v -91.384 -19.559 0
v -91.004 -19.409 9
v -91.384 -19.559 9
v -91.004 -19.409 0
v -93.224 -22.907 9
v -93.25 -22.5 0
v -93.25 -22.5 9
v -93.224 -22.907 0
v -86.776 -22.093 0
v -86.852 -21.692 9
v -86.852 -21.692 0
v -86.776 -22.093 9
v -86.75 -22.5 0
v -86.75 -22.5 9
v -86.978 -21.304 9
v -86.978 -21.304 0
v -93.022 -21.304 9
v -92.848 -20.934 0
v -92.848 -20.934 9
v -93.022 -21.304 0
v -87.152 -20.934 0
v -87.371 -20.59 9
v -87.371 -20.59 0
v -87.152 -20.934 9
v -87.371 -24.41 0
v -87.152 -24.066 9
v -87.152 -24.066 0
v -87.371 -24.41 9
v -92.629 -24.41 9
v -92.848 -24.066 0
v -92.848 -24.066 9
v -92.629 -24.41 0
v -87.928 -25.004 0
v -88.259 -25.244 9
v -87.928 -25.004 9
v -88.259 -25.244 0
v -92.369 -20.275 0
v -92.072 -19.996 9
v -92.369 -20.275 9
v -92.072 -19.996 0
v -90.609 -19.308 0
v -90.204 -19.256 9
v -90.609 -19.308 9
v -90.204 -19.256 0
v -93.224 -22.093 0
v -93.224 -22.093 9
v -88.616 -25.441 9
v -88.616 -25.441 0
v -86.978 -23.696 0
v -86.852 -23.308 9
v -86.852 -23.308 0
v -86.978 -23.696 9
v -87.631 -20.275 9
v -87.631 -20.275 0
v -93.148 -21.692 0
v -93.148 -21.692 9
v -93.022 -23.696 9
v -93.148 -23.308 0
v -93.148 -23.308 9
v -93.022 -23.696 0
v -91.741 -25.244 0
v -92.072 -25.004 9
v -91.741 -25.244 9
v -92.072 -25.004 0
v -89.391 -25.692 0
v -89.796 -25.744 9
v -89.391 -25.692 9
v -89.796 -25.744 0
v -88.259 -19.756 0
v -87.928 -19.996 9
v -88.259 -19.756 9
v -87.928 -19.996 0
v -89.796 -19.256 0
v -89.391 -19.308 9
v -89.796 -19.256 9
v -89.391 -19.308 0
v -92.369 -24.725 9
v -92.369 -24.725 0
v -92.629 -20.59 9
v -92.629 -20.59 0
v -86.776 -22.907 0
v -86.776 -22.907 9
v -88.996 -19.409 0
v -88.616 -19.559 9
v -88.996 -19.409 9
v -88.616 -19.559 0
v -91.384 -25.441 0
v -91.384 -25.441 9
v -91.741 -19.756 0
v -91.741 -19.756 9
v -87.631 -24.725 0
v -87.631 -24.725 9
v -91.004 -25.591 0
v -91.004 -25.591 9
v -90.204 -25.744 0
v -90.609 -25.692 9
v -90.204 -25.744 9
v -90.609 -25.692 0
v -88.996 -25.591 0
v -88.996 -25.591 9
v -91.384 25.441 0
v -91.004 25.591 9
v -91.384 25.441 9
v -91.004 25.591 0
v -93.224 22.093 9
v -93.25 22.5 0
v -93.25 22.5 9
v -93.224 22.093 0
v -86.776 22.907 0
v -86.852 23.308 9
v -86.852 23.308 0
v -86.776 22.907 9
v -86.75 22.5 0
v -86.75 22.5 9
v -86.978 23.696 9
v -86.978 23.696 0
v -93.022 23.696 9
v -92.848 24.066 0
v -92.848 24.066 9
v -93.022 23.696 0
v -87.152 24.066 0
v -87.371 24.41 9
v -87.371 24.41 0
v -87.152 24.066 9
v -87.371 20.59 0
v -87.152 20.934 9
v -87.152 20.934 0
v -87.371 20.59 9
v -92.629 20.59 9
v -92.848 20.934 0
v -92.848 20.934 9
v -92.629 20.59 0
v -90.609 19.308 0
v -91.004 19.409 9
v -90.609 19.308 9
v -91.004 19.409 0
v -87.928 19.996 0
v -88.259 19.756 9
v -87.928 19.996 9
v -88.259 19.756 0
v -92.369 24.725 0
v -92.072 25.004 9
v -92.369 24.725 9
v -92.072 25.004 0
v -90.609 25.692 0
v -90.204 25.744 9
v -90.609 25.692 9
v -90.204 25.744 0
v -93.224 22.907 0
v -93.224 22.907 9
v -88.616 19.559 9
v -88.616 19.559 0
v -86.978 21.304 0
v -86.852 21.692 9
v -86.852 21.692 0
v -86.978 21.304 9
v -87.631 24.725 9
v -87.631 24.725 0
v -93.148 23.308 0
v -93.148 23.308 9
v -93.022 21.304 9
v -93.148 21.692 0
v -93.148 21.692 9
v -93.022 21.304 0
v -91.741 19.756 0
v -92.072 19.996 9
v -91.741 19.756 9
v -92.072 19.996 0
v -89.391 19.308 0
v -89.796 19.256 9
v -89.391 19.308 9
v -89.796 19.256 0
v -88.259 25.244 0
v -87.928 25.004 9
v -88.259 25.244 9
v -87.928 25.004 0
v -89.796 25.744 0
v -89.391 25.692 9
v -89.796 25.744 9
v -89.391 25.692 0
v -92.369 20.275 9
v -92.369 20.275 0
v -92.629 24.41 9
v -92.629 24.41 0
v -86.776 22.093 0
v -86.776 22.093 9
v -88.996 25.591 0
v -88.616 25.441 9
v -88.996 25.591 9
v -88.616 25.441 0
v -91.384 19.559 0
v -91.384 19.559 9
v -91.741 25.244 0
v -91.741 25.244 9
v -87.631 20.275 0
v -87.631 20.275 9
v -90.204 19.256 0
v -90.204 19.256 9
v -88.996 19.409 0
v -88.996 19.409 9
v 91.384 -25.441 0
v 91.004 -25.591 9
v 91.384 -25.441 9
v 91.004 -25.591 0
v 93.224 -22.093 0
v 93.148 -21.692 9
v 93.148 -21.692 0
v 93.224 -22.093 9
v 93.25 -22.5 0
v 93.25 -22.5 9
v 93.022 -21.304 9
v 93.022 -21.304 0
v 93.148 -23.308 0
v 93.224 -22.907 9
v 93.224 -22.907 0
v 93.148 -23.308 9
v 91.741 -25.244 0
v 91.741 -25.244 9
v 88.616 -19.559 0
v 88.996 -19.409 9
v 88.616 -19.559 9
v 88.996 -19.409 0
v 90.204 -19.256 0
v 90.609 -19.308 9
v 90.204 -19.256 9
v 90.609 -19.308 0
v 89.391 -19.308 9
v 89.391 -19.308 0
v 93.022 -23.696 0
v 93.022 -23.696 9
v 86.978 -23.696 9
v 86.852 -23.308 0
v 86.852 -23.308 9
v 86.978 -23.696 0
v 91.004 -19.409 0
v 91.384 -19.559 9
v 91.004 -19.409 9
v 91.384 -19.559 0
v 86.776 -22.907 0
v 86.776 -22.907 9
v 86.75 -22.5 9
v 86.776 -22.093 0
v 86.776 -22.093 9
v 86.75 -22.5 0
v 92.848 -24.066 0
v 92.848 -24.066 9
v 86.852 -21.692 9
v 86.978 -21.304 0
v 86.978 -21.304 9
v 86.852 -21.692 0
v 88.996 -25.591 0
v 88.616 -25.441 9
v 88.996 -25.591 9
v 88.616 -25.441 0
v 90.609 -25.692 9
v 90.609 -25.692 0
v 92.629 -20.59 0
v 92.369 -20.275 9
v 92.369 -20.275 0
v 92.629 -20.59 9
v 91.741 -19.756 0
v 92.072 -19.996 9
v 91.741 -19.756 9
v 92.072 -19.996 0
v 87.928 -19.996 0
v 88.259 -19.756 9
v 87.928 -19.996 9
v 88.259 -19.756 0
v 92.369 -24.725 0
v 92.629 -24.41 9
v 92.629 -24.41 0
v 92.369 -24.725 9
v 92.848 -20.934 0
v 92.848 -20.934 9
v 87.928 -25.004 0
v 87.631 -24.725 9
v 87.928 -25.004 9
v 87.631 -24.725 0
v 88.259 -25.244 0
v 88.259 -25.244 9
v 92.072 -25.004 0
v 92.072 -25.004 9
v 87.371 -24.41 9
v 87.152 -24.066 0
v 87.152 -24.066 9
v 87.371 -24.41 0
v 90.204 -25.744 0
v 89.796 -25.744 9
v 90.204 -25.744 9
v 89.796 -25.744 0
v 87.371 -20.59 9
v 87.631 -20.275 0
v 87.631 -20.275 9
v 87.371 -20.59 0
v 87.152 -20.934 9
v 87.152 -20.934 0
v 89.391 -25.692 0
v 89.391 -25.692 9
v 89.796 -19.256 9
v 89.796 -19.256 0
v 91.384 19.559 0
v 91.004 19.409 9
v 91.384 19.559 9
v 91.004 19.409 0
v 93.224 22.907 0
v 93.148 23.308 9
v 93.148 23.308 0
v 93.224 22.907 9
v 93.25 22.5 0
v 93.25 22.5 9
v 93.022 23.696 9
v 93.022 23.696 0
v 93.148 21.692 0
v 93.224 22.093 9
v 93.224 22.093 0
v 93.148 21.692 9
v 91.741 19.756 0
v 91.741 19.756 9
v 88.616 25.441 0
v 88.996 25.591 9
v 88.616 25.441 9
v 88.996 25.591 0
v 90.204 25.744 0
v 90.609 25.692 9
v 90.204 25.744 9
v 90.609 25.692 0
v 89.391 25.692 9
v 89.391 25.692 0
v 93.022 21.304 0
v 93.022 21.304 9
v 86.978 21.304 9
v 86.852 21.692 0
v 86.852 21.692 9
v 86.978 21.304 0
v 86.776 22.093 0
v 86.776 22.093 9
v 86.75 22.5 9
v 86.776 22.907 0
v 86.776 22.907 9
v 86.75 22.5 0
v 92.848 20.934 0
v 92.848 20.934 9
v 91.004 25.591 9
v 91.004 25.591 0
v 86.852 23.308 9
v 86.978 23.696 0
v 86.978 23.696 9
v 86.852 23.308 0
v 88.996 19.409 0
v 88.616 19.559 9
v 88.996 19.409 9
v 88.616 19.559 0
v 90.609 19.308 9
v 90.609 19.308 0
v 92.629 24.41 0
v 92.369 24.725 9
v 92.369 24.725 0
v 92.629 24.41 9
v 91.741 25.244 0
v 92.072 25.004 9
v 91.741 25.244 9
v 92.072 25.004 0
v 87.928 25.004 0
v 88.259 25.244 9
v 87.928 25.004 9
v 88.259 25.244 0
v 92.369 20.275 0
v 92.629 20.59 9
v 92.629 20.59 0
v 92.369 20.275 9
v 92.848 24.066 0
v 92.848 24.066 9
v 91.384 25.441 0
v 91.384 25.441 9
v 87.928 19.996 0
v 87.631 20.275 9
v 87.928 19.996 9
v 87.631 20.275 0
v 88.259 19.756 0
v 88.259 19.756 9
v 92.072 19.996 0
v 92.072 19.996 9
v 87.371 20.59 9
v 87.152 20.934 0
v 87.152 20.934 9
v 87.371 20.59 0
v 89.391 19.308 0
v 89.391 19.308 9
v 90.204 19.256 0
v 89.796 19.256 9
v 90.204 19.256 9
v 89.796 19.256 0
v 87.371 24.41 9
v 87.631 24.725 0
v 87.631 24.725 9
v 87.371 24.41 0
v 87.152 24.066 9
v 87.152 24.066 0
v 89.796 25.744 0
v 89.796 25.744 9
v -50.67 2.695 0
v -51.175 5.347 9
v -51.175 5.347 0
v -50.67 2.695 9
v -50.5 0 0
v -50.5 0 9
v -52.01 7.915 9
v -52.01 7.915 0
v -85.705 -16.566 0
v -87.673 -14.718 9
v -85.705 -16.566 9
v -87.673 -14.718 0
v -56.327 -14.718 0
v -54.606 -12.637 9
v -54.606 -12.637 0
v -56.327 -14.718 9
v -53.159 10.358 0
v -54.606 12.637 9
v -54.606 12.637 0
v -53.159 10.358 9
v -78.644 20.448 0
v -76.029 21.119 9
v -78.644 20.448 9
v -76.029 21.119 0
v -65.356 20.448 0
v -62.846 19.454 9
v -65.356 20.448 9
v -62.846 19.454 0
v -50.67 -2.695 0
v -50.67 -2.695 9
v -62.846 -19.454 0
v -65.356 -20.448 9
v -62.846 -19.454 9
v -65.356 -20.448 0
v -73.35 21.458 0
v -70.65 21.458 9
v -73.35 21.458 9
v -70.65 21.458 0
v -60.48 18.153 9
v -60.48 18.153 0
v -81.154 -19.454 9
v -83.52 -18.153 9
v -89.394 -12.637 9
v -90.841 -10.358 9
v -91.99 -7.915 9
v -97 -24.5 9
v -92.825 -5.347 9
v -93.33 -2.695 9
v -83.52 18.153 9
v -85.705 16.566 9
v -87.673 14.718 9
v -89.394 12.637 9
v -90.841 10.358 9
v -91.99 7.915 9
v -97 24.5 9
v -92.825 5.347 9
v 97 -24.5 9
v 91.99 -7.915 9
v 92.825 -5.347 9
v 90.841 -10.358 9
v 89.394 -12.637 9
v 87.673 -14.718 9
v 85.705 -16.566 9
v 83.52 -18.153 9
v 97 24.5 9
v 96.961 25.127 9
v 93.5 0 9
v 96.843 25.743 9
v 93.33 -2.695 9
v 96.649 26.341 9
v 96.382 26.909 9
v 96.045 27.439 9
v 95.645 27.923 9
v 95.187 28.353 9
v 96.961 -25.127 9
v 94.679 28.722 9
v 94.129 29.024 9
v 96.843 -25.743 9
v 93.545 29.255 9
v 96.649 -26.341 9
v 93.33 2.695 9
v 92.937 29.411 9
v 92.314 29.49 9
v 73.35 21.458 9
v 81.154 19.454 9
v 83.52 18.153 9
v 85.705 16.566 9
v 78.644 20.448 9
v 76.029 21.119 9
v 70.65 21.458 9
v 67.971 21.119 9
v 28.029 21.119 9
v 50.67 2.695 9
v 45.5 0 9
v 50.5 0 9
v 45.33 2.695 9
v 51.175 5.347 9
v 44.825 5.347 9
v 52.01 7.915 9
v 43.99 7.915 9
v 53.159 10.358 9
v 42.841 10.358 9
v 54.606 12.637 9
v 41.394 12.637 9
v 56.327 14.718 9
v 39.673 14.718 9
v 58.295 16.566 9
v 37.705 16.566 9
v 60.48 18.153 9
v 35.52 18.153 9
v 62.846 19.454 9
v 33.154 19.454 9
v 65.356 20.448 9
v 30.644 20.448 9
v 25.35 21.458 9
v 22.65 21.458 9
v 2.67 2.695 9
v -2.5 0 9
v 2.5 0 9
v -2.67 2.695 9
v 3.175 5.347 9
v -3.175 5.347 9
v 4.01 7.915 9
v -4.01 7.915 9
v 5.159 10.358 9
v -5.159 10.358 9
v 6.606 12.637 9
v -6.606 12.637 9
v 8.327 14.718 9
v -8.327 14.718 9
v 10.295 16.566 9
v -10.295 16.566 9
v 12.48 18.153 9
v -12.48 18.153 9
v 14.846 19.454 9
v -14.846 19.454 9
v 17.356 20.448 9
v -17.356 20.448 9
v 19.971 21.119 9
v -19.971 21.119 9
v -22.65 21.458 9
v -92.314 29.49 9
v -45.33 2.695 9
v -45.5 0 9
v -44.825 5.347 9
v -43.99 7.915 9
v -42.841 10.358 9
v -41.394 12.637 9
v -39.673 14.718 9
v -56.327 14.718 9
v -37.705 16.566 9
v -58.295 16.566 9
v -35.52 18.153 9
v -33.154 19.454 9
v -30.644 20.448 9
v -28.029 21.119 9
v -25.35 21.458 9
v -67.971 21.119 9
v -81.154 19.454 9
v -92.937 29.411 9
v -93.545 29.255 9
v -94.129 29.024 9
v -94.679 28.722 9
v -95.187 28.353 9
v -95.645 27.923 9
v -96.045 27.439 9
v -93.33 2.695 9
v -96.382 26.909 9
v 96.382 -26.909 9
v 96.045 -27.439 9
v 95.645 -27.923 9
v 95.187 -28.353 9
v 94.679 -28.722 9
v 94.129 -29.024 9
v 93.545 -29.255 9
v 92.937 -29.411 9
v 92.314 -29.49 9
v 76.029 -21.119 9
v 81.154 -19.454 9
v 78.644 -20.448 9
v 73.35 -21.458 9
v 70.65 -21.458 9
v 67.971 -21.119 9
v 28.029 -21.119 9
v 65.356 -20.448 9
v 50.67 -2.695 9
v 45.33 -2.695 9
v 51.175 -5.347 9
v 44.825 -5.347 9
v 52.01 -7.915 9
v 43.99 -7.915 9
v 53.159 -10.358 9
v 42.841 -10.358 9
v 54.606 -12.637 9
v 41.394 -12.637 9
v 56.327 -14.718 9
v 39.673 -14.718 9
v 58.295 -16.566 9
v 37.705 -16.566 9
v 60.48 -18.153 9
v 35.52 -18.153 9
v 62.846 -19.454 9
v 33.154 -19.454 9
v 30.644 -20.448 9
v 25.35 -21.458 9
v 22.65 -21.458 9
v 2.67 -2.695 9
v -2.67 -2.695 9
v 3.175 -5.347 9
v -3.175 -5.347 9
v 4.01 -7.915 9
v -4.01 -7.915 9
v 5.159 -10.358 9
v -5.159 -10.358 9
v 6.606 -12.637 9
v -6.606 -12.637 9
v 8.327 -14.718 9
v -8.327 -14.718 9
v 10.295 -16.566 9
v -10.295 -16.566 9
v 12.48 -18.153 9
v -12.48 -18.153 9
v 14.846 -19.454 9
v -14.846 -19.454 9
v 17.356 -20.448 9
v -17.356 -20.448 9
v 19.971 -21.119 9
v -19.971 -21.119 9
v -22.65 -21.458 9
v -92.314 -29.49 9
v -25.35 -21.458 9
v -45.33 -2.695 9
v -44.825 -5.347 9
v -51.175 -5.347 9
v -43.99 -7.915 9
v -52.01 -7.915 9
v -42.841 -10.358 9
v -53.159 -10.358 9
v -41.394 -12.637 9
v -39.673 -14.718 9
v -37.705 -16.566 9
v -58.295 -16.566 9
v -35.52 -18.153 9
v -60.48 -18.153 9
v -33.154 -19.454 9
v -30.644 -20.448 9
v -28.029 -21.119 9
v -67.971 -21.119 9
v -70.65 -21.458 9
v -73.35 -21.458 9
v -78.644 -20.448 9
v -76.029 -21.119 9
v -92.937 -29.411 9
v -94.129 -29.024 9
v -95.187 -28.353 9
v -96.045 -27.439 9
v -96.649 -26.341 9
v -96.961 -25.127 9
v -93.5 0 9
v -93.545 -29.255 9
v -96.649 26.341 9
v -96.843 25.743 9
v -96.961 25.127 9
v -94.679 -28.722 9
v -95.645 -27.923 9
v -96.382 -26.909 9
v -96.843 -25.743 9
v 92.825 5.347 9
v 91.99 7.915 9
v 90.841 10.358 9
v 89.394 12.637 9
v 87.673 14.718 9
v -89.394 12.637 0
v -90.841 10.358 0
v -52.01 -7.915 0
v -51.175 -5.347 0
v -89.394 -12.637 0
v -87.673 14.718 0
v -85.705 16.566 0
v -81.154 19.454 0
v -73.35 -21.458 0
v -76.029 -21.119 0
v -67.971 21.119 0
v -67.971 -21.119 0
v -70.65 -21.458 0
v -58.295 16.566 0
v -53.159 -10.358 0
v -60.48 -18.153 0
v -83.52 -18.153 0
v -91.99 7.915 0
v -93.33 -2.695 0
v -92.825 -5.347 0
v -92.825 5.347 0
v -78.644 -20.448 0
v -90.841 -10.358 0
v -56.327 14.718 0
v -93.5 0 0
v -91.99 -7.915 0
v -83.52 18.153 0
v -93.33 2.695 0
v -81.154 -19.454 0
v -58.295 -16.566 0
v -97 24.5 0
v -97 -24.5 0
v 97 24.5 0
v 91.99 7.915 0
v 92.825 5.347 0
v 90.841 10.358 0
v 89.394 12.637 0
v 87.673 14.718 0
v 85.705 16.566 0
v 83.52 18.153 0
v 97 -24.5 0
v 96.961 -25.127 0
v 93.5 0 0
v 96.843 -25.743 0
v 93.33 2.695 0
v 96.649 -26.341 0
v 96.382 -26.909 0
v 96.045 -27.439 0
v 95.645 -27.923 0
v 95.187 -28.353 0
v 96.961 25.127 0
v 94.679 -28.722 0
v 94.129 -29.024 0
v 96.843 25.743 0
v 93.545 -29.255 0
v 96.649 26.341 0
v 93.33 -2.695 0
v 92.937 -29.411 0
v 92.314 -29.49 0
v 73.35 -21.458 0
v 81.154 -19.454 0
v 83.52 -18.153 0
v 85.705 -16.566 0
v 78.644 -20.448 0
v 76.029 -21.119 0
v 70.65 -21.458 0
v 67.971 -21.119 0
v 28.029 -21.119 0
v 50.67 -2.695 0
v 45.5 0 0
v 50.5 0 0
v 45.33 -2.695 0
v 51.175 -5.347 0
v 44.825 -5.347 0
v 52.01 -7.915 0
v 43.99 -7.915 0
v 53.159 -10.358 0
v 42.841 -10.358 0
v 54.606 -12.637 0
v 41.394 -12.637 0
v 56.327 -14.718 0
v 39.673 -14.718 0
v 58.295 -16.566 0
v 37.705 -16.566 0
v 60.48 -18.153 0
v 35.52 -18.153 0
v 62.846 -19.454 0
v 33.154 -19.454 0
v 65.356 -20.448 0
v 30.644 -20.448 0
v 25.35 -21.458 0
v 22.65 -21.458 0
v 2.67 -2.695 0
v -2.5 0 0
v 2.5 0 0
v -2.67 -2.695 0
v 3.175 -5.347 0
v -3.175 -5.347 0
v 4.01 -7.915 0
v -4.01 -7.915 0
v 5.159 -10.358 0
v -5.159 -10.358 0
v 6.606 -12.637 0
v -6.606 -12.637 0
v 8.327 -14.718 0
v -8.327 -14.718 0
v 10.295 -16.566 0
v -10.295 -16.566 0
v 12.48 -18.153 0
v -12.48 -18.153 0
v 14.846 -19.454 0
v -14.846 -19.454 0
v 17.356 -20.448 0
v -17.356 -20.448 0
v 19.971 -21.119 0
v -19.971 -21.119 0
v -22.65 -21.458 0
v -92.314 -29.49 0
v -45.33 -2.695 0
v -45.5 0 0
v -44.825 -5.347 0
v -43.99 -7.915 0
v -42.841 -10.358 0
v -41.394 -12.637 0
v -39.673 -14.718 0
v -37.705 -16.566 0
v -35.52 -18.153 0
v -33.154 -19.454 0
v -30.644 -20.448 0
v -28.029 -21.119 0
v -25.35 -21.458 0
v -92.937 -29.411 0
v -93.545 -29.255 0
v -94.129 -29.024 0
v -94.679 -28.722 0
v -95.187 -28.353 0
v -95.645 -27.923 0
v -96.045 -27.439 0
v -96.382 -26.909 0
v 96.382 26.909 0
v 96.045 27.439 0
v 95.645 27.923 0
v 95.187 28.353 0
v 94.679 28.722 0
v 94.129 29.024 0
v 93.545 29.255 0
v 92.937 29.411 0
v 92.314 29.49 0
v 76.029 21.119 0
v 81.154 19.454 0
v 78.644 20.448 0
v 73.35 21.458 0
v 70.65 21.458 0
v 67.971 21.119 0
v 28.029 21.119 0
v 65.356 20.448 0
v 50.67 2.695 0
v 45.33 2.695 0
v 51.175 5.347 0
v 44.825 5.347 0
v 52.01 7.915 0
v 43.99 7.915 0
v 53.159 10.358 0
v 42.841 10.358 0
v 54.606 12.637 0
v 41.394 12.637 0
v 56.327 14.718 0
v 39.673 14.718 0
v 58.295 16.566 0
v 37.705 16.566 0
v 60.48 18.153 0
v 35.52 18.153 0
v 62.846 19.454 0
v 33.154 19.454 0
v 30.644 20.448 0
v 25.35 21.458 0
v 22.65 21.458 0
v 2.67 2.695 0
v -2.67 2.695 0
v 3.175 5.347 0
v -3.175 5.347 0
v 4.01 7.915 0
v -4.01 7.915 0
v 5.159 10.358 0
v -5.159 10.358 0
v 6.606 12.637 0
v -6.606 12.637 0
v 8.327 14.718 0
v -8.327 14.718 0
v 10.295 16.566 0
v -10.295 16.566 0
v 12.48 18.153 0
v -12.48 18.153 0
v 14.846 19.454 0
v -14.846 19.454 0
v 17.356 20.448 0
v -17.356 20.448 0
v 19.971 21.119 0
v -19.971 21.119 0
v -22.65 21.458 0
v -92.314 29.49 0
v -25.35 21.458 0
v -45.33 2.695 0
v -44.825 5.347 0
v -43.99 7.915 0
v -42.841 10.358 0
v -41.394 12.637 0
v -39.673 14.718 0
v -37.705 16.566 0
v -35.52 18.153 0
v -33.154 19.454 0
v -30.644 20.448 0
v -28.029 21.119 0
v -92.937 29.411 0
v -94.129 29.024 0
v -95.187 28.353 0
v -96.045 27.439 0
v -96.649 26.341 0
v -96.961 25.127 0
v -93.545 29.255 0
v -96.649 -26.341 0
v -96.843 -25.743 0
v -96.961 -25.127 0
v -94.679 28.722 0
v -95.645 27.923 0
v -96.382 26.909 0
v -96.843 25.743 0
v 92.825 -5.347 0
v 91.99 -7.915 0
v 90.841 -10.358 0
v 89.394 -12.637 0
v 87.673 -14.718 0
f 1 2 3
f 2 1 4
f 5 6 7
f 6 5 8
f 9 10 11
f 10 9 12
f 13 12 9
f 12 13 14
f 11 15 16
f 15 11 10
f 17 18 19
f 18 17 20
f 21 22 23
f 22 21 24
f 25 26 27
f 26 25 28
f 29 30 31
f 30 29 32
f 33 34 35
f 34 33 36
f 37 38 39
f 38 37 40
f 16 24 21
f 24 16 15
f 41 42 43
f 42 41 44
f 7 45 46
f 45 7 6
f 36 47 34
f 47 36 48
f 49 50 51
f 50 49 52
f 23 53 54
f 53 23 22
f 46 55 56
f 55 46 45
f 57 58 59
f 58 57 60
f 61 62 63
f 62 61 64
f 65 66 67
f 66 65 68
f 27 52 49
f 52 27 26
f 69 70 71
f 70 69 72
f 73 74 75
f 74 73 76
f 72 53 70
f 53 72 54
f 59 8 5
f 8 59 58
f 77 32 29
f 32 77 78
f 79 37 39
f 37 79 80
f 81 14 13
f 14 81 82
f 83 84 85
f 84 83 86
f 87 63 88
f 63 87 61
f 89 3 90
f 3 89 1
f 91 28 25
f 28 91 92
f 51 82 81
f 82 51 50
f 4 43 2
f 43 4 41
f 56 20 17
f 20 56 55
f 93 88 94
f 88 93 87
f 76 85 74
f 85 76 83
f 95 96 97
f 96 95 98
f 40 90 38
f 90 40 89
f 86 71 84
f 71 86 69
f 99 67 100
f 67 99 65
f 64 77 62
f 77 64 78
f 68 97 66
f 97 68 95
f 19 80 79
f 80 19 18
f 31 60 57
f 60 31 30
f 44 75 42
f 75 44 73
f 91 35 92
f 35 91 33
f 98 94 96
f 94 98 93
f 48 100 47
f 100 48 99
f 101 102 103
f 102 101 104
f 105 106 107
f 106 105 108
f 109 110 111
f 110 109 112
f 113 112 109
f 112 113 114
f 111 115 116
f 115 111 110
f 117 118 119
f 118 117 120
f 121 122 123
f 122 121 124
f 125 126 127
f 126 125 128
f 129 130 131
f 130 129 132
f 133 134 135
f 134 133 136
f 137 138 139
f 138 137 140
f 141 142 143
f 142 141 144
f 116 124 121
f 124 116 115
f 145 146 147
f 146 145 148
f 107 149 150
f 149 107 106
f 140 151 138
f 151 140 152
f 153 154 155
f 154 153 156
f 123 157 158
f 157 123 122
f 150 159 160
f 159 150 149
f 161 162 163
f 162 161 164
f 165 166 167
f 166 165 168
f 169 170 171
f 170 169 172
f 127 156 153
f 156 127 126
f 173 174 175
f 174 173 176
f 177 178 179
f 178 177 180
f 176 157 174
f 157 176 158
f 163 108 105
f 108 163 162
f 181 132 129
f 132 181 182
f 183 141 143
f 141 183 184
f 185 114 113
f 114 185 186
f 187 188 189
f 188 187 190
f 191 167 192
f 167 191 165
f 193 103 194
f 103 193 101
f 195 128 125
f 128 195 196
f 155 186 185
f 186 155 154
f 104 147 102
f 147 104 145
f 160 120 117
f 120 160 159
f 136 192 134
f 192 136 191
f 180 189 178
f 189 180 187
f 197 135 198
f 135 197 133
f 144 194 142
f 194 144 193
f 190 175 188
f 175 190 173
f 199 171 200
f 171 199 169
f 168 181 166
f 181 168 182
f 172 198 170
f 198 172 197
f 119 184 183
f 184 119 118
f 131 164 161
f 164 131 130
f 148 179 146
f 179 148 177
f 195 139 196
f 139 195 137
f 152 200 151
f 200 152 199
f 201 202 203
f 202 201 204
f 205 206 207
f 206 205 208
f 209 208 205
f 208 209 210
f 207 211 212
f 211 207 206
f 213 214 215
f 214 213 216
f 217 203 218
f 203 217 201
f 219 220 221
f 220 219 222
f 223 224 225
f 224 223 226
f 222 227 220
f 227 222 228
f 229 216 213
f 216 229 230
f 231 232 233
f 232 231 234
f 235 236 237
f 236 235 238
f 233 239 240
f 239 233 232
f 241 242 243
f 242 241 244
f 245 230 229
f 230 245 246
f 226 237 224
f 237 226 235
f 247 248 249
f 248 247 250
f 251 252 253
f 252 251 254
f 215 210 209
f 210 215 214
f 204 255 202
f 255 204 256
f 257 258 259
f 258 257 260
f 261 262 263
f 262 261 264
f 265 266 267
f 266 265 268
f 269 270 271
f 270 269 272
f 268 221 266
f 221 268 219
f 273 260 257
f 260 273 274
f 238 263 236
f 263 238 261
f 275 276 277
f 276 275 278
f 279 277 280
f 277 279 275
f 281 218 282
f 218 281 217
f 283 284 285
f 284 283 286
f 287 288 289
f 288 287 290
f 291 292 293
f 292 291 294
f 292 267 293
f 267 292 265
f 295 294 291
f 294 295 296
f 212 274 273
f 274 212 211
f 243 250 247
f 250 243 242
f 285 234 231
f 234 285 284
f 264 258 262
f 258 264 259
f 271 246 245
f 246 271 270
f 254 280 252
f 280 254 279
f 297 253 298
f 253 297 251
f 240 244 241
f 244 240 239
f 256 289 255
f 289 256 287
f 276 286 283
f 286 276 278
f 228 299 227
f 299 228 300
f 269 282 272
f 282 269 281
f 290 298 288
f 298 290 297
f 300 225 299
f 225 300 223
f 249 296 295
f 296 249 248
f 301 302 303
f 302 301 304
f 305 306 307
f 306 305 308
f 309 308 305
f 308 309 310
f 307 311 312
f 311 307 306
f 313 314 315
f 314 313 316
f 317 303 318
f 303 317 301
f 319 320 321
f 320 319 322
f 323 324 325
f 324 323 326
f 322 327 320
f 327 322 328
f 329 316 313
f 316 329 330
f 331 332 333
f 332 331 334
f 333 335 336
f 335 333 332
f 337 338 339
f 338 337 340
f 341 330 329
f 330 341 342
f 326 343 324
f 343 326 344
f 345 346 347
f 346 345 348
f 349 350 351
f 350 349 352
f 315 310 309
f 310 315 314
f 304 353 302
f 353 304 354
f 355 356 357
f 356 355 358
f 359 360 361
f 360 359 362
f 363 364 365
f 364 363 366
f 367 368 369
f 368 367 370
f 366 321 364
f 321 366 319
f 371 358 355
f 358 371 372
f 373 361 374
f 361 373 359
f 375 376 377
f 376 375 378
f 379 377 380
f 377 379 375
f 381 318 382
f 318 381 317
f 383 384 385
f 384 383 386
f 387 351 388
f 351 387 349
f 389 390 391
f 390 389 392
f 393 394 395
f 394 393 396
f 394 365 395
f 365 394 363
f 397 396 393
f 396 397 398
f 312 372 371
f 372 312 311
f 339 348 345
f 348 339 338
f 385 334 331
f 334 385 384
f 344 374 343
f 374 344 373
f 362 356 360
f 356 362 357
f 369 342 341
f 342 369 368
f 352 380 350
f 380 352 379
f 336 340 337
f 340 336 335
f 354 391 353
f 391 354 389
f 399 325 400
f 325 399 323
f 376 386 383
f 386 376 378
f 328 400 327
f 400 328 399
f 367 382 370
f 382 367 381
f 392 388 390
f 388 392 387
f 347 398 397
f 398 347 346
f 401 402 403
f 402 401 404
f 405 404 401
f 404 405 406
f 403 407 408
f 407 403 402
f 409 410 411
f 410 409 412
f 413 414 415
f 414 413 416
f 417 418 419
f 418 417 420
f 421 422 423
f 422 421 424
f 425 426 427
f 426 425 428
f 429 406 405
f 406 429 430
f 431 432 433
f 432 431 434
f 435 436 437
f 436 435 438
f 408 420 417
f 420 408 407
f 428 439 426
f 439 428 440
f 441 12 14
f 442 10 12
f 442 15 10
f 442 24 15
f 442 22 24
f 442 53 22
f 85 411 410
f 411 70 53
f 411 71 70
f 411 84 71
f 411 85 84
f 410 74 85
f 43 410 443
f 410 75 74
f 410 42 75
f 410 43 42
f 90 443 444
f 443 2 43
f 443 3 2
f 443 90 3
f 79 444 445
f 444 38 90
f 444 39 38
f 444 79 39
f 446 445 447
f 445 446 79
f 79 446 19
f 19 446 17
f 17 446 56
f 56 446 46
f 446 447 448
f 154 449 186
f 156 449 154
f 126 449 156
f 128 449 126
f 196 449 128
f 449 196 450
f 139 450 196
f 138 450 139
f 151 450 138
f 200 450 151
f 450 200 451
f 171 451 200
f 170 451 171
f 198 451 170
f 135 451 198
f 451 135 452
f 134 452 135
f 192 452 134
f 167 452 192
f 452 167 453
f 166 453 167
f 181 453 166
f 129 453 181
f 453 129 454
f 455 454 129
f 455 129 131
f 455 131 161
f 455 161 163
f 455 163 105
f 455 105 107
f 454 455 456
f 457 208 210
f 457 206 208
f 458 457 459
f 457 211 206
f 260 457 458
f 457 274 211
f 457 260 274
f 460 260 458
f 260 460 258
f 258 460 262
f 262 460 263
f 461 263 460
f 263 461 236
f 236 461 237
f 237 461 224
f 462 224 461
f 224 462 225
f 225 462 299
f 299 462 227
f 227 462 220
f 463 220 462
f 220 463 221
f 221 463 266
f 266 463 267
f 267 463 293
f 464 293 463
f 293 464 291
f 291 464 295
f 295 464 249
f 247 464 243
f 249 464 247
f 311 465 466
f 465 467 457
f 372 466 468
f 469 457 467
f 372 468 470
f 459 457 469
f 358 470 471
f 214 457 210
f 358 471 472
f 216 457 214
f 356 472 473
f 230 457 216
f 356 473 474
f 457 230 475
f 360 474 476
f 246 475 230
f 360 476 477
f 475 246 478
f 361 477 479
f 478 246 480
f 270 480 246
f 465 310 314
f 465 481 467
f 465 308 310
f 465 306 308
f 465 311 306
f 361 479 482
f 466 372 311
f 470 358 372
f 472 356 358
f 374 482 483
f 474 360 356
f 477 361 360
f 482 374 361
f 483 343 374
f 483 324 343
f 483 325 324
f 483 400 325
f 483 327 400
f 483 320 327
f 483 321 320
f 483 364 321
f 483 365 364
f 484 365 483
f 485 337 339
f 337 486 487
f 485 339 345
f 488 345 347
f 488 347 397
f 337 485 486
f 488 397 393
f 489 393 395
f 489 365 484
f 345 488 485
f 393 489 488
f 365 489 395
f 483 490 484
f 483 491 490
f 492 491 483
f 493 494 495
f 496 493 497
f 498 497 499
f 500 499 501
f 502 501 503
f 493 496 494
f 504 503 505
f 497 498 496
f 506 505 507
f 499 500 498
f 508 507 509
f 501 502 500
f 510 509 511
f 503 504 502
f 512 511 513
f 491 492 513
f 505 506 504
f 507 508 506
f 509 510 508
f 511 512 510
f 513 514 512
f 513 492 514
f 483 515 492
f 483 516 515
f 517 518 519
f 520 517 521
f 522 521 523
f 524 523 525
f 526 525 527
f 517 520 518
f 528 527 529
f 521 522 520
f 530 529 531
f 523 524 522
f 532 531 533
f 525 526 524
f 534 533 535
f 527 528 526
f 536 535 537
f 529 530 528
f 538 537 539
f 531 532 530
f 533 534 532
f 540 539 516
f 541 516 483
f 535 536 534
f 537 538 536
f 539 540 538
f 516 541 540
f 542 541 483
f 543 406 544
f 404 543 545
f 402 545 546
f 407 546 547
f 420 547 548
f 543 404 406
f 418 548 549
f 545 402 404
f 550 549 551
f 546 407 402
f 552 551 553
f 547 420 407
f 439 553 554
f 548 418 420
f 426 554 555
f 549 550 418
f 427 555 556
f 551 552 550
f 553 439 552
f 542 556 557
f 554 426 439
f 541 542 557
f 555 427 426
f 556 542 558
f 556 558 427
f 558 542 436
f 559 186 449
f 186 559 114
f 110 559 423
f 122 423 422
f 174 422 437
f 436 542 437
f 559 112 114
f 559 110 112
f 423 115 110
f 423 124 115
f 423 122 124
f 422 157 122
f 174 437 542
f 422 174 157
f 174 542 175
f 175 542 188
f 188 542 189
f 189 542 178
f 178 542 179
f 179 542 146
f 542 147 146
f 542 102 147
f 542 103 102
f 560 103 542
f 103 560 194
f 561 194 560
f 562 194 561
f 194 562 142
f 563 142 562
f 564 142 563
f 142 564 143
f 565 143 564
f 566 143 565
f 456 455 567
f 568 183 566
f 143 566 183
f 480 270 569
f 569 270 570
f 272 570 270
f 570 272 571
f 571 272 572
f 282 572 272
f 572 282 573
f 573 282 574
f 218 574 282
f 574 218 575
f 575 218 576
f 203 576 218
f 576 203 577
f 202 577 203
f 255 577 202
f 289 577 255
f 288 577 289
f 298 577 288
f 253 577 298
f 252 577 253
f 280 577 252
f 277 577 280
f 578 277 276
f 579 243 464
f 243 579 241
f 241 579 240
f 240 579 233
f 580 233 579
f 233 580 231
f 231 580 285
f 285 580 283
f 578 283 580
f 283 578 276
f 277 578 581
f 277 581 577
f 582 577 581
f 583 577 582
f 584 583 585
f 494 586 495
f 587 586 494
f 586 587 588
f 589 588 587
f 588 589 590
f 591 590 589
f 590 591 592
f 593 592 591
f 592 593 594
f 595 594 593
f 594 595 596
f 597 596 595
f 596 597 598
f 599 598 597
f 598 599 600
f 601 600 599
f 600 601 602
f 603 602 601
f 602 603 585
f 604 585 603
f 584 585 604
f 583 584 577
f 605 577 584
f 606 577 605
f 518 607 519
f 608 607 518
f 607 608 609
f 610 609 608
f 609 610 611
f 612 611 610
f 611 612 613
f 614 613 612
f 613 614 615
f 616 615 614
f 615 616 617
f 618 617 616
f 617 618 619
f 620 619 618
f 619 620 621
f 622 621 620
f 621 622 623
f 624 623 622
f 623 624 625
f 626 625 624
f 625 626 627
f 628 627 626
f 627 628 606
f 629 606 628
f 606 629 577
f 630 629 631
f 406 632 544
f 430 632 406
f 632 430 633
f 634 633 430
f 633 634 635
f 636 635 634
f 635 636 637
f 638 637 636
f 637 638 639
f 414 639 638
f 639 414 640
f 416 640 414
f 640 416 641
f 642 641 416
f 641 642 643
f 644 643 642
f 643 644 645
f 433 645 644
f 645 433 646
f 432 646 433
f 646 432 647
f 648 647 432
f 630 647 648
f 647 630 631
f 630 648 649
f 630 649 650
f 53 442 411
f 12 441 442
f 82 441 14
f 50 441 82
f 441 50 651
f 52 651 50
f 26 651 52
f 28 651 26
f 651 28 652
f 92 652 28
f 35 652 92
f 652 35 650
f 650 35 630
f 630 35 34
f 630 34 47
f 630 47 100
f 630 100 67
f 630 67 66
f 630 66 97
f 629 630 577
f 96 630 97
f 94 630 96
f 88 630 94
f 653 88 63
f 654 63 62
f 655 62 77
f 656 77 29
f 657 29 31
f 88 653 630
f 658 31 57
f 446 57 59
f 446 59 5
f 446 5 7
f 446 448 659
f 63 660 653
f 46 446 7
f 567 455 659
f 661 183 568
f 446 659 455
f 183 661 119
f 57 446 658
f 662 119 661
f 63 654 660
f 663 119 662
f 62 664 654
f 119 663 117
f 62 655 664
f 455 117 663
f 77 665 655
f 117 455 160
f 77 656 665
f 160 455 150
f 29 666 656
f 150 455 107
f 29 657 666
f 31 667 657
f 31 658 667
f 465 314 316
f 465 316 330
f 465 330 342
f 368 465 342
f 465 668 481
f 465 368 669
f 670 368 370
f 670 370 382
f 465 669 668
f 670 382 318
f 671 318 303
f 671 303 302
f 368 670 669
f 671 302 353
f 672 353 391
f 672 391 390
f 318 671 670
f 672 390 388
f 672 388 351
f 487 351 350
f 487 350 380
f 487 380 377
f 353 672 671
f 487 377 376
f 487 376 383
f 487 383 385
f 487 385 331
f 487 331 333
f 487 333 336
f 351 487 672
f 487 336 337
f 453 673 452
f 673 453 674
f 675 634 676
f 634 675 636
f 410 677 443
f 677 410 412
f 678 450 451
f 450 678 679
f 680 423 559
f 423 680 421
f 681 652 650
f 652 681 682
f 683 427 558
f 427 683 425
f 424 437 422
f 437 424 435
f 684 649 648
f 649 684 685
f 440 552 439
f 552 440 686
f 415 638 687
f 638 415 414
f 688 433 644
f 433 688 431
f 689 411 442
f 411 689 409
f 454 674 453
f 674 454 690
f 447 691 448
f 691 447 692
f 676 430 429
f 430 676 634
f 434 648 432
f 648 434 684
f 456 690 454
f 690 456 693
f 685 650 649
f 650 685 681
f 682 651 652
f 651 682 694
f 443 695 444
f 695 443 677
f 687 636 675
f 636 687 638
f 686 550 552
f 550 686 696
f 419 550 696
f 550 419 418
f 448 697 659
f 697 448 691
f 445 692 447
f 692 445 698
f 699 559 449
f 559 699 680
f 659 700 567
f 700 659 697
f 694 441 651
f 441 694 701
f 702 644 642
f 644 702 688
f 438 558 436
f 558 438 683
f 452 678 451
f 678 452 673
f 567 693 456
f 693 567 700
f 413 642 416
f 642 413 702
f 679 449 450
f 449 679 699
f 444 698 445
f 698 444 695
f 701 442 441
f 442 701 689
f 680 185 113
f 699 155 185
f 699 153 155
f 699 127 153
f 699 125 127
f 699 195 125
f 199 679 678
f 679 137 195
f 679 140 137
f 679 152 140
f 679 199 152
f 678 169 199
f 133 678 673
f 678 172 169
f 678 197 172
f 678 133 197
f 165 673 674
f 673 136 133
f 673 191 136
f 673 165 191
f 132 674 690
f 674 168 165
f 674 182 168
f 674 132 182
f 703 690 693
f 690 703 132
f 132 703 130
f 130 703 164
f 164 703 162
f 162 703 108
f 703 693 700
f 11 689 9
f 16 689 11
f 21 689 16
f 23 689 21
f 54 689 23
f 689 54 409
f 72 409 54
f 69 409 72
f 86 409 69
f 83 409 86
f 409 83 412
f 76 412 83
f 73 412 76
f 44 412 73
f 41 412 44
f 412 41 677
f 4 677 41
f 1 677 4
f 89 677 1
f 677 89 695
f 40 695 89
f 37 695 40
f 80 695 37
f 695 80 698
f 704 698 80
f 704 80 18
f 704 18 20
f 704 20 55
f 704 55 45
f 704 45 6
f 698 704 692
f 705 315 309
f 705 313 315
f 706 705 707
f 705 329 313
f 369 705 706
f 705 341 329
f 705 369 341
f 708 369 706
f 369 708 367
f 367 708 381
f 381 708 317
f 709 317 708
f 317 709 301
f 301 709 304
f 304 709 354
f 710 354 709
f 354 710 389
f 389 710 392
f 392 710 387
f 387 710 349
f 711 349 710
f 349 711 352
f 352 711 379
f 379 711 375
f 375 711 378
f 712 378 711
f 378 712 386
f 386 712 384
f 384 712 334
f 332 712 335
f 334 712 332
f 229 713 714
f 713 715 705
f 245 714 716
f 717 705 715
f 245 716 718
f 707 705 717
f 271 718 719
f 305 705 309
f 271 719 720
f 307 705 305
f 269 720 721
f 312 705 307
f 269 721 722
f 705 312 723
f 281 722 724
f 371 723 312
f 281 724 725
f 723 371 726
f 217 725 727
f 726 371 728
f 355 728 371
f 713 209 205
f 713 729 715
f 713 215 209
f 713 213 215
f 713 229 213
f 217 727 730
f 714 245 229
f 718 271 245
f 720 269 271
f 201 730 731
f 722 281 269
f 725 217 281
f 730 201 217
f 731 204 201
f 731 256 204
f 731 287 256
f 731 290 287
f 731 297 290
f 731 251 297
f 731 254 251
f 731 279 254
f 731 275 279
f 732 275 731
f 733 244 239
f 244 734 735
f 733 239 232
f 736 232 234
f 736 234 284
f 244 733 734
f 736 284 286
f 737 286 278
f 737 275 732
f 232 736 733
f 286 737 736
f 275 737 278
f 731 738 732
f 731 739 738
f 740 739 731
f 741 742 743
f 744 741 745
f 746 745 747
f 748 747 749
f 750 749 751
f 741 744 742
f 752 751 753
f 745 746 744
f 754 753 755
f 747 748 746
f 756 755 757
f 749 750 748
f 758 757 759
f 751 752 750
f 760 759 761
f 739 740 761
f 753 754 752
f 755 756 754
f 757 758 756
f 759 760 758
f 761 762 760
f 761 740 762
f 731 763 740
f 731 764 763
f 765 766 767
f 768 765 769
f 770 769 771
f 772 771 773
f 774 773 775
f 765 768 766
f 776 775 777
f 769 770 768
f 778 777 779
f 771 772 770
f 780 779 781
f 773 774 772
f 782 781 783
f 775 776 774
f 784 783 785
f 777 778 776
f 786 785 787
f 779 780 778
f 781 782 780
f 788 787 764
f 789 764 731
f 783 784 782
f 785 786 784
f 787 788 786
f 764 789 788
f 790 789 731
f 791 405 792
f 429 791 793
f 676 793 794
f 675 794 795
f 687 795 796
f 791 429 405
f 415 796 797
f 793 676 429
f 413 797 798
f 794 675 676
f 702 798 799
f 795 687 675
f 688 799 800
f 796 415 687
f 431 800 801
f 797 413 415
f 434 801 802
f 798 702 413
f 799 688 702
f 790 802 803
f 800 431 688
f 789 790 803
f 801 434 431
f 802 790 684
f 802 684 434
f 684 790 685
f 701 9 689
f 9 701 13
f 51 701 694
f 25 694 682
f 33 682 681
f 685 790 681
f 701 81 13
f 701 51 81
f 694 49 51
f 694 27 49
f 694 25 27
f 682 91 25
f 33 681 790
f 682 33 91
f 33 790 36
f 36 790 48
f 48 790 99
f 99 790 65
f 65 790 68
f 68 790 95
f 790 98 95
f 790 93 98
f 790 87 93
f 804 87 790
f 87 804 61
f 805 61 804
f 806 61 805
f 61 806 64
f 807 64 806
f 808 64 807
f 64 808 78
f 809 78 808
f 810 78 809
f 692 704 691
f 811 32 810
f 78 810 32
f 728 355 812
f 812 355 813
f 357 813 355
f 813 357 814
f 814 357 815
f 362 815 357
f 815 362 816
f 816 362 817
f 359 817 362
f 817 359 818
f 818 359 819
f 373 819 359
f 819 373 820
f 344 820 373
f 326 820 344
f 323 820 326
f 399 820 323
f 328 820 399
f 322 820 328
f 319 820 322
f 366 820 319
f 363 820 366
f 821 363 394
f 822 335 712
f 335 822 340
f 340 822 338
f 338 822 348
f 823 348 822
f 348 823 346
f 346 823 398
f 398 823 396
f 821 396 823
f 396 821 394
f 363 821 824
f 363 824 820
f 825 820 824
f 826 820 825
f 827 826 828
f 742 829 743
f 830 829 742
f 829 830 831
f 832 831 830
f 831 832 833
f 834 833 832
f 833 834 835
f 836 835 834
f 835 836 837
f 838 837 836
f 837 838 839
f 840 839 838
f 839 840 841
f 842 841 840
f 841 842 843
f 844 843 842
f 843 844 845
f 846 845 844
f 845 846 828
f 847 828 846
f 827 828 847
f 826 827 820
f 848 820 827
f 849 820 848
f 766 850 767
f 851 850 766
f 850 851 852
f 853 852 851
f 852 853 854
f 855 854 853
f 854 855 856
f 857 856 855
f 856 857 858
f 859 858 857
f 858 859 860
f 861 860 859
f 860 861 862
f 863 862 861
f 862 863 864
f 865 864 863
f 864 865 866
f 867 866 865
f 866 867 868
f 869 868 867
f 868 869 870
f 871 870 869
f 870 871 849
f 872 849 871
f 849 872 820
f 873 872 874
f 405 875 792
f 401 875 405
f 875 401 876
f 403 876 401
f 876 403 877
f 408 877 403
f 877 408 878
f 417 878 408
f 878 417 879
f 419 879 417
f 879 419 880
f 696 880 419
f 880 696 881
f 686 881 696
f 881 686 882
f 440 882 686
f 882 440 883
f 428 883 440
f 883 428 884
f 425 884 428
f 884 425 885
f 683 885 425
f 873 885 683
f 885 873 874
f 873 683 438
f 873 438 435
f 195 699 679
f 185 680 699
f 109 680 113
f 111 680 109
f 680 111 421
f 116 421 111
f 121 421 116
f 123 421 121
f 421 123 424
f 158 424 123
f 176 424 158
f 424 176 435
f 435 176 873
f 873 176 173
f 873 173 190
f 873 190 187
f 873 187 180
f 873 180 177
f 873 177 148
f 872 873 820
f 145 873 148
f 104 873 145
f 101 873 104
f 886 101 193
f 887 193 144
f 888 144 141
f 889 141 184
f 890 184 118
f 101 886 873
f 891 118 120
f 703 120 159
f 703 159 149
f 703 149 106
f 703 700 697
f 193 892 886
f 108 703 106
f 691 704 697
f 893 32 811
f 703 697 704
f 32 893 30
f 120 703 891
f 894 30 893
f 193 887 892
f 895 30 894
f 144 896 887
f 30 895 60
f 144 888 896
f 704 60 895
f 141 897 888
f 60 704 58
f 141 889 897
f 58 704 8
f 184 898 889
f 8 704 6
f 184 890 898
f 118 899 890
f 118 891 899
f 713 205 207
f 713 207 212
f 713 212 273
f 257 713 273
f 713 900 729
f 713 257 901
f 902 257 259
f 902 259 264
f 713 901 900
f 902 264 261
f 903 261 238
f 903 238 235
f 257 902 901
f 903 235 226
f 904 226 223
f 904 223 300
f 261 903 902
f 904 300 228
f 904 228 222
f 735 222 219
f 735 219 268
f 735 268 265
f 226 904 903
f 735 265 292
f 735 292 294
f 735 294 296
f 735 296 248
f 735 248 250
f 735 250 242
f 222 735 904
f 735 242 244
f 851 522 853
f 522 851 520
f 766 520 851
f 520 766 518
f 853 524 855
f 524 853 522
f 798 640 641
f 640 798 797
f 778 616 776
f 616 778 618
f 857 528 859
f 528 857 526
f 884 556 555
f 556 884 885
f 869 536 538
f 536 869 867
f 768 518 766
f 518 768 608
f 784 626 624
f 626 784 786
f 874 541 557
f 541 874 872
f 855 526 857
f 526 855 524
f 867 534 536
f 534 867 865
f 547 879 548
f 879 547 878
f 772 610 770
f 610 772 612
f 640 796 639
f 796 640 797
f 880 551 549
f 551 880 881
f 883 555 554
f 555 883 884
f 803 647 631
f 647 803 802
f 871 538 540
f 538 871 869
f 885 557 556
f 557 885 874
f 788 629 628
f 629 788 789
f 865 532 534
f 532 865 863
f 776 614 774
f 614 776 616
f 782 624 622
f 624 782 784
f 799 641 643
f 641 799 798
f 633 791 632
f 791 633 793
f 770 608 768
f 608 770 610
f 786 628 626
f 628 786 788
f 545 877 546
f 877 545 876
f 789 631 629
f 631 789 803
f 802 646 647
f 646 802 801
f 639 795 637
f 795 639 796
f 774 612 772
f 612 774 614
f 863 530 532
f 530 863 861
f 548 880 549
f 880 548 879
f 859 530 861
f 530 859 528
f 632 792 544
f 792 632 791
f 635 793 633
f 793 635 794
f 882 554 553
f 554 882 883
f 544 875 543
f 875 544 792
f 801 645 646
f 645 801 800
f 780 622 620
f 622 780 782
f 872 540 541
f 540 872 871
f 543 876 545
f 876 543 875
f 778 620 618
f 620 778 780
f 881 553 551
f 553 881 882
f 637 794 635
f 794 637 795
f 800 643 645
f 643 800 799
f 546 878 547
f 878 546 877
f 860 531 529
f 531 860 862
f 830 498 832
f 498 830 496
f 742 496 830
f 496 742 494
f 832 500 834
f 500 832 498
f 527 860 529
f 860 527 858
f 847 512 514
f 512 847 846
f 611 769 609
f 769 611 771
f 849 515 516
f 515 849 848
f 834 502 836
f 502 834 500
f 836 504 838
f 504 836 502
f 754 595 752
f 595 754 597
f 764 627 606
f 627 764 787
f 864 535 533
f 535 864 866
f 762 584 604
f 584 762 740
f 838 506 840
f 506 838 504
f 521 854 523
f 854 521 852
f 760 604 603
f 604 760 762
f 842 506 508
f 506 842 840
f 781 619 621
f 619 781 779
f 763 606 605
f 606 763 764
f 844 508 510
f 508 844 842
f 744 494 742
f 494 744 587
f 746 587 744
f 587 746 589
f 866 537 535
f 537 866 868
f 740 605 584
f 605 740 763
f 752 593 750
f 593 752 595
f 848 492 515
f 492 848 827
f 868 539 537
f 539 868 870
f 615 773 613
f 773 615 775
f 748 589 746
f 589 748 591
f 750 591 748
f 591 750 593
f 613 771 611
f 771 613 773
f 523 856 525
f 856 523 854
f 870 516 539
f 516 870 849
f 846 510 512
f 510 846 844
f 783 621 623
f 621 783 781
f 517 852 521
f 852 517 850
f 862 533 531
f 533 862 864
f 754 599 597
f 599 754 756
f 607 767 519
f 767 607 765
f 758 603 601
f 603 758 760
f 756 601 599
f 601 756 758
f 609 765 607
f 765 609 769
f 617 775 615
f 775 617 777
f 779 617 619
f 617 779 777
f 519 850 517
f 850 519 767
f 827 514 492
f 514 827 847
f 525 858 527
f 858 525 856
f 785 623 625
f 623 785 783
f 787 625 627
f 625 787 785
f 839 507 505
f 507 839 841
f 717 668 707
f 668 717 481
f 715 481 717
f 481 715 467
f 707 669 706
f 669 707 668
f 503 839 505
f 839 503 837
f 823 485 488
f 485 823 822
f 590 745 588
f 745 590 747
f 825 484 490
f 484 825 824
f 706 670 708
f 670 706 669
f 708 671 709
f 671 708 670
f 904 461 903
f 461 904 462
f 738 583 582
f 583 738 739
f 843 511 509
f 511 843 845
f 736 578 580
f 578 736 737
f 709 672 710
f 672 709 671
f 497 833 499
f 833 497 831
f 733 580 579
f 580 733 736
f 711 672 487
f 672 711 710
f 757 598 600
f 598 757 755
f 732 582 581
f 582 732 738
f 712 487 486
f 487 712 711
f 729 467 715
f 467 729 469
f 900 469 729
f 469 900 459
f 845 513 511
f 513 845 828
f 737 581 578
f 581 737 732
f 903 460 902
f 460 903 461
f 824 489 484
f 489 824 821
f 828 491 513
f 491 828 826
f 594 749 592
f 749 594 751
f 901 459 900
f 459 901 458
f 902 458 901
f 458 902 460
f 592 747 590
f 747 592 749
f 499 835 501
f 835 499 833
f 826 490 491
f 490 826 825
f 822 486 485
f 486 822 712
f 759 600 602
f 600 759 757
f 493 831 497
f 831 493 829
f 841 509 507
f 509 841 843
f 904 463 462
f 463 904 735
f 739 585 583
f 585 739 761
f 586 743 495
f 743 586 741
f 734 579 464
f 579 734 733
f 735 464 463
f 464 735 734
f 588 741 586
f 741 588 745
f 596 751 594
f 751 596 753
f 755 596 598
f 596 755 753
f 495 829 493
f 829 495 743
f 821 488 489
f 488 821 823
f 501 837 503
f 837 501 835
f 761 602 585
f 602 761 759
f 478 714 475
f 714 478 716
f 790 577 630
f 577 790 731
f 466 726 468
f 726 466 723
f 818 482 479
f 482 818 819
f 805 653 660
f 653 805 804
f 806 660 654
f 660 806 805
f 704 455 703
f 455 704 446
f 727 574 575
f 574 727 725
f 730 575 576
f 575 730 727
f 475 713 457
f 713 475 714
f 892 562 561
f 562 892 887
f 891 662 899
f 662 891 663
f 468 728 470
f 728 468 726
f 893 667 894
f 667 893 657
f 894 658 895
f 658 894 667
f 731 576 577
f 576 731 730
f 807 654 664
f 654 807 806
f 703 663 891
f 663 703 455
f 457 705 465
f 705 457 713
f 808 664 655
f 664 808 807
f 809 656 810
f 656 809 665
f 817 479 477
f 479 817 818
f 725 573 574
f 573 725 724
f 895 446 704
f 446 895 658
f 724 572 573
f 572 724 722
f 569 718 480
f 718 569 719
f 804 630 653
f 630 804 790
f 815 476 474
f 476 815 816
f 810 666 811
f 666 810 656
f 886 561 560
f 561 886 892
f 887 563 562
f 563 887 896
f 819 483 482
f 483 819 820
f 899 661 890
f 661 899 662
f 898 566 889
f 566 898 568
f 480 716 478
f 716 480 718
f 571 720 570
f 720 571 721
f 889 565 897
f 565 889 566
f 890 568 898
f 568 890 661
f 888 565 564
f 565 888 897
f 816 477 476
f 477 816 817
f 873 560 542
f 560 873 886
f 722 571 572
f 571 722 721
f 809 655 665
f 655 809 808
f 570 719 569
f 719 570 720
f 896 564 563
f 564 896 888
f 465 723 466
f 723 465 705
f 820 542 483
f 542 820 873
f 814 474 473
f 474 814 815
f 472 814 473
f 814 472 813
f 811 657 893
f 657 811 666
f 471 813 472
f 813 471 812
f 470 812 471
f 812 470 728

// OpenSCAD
$fn = 50;


difference() {
	union() {
		hull() {
			translate(v = [-92.0000000000, 24.5000000000, 0]) {
				cylinder(h = 9, r = 5);
			}
			translate(v = [92.0000000000, 24.5000000000, 0]) {
				cylinder(h = 9, r = 5);
			}
			translate(v = [-92.0000000000, -24.5000000000, 0]) {
				cylinder(h = 9, r = 5);
			}
			translate(v = [92.0000000000, -24.5000000000, 0]) {
				cylinder(h = 9, r = 5);
			}
		}
	}
	union() {
		#translate(v = [-90.0000000000, -22.5000000000, -100.0000000000]) {
			cylinder(h = 200, r = 3.2500000000);
		}
		#translate(v = [-90.0000000000, 22.5000000000, -100.0000000000]) {
			cylinder(h = 200, r = 3.2500000000);
		}
		#translate(v = [90.0000000000, -22.5000000000, -100.0000000000]) {
			cylinder(h = 200, r = 3.2500000000);
		}
		#translate(v = [90.0000000000, 22.5000000000, -100.0000000000]) {
			cylinder(h = 200, r = 3.2500000000);
		}
		#translate(v = [-72.0000000000, 0, 0]) {
			cylinder(h = 9, r = 21.5000000000);
		}
		#translate(v = [-24.0000000000, 0, 0]) {
			cylinder(h = 9, r = 21.5000000000);
		}
		#translate(v = [24.0000000000, 0, 0]) {
			cylinder(h = 9, r = 21.5000000000);
		}
		#translate(v = [72.0000000000, 0, 0]) {
			cylinder(h = 9, r = 21.5000000000);
		}
	}
}
